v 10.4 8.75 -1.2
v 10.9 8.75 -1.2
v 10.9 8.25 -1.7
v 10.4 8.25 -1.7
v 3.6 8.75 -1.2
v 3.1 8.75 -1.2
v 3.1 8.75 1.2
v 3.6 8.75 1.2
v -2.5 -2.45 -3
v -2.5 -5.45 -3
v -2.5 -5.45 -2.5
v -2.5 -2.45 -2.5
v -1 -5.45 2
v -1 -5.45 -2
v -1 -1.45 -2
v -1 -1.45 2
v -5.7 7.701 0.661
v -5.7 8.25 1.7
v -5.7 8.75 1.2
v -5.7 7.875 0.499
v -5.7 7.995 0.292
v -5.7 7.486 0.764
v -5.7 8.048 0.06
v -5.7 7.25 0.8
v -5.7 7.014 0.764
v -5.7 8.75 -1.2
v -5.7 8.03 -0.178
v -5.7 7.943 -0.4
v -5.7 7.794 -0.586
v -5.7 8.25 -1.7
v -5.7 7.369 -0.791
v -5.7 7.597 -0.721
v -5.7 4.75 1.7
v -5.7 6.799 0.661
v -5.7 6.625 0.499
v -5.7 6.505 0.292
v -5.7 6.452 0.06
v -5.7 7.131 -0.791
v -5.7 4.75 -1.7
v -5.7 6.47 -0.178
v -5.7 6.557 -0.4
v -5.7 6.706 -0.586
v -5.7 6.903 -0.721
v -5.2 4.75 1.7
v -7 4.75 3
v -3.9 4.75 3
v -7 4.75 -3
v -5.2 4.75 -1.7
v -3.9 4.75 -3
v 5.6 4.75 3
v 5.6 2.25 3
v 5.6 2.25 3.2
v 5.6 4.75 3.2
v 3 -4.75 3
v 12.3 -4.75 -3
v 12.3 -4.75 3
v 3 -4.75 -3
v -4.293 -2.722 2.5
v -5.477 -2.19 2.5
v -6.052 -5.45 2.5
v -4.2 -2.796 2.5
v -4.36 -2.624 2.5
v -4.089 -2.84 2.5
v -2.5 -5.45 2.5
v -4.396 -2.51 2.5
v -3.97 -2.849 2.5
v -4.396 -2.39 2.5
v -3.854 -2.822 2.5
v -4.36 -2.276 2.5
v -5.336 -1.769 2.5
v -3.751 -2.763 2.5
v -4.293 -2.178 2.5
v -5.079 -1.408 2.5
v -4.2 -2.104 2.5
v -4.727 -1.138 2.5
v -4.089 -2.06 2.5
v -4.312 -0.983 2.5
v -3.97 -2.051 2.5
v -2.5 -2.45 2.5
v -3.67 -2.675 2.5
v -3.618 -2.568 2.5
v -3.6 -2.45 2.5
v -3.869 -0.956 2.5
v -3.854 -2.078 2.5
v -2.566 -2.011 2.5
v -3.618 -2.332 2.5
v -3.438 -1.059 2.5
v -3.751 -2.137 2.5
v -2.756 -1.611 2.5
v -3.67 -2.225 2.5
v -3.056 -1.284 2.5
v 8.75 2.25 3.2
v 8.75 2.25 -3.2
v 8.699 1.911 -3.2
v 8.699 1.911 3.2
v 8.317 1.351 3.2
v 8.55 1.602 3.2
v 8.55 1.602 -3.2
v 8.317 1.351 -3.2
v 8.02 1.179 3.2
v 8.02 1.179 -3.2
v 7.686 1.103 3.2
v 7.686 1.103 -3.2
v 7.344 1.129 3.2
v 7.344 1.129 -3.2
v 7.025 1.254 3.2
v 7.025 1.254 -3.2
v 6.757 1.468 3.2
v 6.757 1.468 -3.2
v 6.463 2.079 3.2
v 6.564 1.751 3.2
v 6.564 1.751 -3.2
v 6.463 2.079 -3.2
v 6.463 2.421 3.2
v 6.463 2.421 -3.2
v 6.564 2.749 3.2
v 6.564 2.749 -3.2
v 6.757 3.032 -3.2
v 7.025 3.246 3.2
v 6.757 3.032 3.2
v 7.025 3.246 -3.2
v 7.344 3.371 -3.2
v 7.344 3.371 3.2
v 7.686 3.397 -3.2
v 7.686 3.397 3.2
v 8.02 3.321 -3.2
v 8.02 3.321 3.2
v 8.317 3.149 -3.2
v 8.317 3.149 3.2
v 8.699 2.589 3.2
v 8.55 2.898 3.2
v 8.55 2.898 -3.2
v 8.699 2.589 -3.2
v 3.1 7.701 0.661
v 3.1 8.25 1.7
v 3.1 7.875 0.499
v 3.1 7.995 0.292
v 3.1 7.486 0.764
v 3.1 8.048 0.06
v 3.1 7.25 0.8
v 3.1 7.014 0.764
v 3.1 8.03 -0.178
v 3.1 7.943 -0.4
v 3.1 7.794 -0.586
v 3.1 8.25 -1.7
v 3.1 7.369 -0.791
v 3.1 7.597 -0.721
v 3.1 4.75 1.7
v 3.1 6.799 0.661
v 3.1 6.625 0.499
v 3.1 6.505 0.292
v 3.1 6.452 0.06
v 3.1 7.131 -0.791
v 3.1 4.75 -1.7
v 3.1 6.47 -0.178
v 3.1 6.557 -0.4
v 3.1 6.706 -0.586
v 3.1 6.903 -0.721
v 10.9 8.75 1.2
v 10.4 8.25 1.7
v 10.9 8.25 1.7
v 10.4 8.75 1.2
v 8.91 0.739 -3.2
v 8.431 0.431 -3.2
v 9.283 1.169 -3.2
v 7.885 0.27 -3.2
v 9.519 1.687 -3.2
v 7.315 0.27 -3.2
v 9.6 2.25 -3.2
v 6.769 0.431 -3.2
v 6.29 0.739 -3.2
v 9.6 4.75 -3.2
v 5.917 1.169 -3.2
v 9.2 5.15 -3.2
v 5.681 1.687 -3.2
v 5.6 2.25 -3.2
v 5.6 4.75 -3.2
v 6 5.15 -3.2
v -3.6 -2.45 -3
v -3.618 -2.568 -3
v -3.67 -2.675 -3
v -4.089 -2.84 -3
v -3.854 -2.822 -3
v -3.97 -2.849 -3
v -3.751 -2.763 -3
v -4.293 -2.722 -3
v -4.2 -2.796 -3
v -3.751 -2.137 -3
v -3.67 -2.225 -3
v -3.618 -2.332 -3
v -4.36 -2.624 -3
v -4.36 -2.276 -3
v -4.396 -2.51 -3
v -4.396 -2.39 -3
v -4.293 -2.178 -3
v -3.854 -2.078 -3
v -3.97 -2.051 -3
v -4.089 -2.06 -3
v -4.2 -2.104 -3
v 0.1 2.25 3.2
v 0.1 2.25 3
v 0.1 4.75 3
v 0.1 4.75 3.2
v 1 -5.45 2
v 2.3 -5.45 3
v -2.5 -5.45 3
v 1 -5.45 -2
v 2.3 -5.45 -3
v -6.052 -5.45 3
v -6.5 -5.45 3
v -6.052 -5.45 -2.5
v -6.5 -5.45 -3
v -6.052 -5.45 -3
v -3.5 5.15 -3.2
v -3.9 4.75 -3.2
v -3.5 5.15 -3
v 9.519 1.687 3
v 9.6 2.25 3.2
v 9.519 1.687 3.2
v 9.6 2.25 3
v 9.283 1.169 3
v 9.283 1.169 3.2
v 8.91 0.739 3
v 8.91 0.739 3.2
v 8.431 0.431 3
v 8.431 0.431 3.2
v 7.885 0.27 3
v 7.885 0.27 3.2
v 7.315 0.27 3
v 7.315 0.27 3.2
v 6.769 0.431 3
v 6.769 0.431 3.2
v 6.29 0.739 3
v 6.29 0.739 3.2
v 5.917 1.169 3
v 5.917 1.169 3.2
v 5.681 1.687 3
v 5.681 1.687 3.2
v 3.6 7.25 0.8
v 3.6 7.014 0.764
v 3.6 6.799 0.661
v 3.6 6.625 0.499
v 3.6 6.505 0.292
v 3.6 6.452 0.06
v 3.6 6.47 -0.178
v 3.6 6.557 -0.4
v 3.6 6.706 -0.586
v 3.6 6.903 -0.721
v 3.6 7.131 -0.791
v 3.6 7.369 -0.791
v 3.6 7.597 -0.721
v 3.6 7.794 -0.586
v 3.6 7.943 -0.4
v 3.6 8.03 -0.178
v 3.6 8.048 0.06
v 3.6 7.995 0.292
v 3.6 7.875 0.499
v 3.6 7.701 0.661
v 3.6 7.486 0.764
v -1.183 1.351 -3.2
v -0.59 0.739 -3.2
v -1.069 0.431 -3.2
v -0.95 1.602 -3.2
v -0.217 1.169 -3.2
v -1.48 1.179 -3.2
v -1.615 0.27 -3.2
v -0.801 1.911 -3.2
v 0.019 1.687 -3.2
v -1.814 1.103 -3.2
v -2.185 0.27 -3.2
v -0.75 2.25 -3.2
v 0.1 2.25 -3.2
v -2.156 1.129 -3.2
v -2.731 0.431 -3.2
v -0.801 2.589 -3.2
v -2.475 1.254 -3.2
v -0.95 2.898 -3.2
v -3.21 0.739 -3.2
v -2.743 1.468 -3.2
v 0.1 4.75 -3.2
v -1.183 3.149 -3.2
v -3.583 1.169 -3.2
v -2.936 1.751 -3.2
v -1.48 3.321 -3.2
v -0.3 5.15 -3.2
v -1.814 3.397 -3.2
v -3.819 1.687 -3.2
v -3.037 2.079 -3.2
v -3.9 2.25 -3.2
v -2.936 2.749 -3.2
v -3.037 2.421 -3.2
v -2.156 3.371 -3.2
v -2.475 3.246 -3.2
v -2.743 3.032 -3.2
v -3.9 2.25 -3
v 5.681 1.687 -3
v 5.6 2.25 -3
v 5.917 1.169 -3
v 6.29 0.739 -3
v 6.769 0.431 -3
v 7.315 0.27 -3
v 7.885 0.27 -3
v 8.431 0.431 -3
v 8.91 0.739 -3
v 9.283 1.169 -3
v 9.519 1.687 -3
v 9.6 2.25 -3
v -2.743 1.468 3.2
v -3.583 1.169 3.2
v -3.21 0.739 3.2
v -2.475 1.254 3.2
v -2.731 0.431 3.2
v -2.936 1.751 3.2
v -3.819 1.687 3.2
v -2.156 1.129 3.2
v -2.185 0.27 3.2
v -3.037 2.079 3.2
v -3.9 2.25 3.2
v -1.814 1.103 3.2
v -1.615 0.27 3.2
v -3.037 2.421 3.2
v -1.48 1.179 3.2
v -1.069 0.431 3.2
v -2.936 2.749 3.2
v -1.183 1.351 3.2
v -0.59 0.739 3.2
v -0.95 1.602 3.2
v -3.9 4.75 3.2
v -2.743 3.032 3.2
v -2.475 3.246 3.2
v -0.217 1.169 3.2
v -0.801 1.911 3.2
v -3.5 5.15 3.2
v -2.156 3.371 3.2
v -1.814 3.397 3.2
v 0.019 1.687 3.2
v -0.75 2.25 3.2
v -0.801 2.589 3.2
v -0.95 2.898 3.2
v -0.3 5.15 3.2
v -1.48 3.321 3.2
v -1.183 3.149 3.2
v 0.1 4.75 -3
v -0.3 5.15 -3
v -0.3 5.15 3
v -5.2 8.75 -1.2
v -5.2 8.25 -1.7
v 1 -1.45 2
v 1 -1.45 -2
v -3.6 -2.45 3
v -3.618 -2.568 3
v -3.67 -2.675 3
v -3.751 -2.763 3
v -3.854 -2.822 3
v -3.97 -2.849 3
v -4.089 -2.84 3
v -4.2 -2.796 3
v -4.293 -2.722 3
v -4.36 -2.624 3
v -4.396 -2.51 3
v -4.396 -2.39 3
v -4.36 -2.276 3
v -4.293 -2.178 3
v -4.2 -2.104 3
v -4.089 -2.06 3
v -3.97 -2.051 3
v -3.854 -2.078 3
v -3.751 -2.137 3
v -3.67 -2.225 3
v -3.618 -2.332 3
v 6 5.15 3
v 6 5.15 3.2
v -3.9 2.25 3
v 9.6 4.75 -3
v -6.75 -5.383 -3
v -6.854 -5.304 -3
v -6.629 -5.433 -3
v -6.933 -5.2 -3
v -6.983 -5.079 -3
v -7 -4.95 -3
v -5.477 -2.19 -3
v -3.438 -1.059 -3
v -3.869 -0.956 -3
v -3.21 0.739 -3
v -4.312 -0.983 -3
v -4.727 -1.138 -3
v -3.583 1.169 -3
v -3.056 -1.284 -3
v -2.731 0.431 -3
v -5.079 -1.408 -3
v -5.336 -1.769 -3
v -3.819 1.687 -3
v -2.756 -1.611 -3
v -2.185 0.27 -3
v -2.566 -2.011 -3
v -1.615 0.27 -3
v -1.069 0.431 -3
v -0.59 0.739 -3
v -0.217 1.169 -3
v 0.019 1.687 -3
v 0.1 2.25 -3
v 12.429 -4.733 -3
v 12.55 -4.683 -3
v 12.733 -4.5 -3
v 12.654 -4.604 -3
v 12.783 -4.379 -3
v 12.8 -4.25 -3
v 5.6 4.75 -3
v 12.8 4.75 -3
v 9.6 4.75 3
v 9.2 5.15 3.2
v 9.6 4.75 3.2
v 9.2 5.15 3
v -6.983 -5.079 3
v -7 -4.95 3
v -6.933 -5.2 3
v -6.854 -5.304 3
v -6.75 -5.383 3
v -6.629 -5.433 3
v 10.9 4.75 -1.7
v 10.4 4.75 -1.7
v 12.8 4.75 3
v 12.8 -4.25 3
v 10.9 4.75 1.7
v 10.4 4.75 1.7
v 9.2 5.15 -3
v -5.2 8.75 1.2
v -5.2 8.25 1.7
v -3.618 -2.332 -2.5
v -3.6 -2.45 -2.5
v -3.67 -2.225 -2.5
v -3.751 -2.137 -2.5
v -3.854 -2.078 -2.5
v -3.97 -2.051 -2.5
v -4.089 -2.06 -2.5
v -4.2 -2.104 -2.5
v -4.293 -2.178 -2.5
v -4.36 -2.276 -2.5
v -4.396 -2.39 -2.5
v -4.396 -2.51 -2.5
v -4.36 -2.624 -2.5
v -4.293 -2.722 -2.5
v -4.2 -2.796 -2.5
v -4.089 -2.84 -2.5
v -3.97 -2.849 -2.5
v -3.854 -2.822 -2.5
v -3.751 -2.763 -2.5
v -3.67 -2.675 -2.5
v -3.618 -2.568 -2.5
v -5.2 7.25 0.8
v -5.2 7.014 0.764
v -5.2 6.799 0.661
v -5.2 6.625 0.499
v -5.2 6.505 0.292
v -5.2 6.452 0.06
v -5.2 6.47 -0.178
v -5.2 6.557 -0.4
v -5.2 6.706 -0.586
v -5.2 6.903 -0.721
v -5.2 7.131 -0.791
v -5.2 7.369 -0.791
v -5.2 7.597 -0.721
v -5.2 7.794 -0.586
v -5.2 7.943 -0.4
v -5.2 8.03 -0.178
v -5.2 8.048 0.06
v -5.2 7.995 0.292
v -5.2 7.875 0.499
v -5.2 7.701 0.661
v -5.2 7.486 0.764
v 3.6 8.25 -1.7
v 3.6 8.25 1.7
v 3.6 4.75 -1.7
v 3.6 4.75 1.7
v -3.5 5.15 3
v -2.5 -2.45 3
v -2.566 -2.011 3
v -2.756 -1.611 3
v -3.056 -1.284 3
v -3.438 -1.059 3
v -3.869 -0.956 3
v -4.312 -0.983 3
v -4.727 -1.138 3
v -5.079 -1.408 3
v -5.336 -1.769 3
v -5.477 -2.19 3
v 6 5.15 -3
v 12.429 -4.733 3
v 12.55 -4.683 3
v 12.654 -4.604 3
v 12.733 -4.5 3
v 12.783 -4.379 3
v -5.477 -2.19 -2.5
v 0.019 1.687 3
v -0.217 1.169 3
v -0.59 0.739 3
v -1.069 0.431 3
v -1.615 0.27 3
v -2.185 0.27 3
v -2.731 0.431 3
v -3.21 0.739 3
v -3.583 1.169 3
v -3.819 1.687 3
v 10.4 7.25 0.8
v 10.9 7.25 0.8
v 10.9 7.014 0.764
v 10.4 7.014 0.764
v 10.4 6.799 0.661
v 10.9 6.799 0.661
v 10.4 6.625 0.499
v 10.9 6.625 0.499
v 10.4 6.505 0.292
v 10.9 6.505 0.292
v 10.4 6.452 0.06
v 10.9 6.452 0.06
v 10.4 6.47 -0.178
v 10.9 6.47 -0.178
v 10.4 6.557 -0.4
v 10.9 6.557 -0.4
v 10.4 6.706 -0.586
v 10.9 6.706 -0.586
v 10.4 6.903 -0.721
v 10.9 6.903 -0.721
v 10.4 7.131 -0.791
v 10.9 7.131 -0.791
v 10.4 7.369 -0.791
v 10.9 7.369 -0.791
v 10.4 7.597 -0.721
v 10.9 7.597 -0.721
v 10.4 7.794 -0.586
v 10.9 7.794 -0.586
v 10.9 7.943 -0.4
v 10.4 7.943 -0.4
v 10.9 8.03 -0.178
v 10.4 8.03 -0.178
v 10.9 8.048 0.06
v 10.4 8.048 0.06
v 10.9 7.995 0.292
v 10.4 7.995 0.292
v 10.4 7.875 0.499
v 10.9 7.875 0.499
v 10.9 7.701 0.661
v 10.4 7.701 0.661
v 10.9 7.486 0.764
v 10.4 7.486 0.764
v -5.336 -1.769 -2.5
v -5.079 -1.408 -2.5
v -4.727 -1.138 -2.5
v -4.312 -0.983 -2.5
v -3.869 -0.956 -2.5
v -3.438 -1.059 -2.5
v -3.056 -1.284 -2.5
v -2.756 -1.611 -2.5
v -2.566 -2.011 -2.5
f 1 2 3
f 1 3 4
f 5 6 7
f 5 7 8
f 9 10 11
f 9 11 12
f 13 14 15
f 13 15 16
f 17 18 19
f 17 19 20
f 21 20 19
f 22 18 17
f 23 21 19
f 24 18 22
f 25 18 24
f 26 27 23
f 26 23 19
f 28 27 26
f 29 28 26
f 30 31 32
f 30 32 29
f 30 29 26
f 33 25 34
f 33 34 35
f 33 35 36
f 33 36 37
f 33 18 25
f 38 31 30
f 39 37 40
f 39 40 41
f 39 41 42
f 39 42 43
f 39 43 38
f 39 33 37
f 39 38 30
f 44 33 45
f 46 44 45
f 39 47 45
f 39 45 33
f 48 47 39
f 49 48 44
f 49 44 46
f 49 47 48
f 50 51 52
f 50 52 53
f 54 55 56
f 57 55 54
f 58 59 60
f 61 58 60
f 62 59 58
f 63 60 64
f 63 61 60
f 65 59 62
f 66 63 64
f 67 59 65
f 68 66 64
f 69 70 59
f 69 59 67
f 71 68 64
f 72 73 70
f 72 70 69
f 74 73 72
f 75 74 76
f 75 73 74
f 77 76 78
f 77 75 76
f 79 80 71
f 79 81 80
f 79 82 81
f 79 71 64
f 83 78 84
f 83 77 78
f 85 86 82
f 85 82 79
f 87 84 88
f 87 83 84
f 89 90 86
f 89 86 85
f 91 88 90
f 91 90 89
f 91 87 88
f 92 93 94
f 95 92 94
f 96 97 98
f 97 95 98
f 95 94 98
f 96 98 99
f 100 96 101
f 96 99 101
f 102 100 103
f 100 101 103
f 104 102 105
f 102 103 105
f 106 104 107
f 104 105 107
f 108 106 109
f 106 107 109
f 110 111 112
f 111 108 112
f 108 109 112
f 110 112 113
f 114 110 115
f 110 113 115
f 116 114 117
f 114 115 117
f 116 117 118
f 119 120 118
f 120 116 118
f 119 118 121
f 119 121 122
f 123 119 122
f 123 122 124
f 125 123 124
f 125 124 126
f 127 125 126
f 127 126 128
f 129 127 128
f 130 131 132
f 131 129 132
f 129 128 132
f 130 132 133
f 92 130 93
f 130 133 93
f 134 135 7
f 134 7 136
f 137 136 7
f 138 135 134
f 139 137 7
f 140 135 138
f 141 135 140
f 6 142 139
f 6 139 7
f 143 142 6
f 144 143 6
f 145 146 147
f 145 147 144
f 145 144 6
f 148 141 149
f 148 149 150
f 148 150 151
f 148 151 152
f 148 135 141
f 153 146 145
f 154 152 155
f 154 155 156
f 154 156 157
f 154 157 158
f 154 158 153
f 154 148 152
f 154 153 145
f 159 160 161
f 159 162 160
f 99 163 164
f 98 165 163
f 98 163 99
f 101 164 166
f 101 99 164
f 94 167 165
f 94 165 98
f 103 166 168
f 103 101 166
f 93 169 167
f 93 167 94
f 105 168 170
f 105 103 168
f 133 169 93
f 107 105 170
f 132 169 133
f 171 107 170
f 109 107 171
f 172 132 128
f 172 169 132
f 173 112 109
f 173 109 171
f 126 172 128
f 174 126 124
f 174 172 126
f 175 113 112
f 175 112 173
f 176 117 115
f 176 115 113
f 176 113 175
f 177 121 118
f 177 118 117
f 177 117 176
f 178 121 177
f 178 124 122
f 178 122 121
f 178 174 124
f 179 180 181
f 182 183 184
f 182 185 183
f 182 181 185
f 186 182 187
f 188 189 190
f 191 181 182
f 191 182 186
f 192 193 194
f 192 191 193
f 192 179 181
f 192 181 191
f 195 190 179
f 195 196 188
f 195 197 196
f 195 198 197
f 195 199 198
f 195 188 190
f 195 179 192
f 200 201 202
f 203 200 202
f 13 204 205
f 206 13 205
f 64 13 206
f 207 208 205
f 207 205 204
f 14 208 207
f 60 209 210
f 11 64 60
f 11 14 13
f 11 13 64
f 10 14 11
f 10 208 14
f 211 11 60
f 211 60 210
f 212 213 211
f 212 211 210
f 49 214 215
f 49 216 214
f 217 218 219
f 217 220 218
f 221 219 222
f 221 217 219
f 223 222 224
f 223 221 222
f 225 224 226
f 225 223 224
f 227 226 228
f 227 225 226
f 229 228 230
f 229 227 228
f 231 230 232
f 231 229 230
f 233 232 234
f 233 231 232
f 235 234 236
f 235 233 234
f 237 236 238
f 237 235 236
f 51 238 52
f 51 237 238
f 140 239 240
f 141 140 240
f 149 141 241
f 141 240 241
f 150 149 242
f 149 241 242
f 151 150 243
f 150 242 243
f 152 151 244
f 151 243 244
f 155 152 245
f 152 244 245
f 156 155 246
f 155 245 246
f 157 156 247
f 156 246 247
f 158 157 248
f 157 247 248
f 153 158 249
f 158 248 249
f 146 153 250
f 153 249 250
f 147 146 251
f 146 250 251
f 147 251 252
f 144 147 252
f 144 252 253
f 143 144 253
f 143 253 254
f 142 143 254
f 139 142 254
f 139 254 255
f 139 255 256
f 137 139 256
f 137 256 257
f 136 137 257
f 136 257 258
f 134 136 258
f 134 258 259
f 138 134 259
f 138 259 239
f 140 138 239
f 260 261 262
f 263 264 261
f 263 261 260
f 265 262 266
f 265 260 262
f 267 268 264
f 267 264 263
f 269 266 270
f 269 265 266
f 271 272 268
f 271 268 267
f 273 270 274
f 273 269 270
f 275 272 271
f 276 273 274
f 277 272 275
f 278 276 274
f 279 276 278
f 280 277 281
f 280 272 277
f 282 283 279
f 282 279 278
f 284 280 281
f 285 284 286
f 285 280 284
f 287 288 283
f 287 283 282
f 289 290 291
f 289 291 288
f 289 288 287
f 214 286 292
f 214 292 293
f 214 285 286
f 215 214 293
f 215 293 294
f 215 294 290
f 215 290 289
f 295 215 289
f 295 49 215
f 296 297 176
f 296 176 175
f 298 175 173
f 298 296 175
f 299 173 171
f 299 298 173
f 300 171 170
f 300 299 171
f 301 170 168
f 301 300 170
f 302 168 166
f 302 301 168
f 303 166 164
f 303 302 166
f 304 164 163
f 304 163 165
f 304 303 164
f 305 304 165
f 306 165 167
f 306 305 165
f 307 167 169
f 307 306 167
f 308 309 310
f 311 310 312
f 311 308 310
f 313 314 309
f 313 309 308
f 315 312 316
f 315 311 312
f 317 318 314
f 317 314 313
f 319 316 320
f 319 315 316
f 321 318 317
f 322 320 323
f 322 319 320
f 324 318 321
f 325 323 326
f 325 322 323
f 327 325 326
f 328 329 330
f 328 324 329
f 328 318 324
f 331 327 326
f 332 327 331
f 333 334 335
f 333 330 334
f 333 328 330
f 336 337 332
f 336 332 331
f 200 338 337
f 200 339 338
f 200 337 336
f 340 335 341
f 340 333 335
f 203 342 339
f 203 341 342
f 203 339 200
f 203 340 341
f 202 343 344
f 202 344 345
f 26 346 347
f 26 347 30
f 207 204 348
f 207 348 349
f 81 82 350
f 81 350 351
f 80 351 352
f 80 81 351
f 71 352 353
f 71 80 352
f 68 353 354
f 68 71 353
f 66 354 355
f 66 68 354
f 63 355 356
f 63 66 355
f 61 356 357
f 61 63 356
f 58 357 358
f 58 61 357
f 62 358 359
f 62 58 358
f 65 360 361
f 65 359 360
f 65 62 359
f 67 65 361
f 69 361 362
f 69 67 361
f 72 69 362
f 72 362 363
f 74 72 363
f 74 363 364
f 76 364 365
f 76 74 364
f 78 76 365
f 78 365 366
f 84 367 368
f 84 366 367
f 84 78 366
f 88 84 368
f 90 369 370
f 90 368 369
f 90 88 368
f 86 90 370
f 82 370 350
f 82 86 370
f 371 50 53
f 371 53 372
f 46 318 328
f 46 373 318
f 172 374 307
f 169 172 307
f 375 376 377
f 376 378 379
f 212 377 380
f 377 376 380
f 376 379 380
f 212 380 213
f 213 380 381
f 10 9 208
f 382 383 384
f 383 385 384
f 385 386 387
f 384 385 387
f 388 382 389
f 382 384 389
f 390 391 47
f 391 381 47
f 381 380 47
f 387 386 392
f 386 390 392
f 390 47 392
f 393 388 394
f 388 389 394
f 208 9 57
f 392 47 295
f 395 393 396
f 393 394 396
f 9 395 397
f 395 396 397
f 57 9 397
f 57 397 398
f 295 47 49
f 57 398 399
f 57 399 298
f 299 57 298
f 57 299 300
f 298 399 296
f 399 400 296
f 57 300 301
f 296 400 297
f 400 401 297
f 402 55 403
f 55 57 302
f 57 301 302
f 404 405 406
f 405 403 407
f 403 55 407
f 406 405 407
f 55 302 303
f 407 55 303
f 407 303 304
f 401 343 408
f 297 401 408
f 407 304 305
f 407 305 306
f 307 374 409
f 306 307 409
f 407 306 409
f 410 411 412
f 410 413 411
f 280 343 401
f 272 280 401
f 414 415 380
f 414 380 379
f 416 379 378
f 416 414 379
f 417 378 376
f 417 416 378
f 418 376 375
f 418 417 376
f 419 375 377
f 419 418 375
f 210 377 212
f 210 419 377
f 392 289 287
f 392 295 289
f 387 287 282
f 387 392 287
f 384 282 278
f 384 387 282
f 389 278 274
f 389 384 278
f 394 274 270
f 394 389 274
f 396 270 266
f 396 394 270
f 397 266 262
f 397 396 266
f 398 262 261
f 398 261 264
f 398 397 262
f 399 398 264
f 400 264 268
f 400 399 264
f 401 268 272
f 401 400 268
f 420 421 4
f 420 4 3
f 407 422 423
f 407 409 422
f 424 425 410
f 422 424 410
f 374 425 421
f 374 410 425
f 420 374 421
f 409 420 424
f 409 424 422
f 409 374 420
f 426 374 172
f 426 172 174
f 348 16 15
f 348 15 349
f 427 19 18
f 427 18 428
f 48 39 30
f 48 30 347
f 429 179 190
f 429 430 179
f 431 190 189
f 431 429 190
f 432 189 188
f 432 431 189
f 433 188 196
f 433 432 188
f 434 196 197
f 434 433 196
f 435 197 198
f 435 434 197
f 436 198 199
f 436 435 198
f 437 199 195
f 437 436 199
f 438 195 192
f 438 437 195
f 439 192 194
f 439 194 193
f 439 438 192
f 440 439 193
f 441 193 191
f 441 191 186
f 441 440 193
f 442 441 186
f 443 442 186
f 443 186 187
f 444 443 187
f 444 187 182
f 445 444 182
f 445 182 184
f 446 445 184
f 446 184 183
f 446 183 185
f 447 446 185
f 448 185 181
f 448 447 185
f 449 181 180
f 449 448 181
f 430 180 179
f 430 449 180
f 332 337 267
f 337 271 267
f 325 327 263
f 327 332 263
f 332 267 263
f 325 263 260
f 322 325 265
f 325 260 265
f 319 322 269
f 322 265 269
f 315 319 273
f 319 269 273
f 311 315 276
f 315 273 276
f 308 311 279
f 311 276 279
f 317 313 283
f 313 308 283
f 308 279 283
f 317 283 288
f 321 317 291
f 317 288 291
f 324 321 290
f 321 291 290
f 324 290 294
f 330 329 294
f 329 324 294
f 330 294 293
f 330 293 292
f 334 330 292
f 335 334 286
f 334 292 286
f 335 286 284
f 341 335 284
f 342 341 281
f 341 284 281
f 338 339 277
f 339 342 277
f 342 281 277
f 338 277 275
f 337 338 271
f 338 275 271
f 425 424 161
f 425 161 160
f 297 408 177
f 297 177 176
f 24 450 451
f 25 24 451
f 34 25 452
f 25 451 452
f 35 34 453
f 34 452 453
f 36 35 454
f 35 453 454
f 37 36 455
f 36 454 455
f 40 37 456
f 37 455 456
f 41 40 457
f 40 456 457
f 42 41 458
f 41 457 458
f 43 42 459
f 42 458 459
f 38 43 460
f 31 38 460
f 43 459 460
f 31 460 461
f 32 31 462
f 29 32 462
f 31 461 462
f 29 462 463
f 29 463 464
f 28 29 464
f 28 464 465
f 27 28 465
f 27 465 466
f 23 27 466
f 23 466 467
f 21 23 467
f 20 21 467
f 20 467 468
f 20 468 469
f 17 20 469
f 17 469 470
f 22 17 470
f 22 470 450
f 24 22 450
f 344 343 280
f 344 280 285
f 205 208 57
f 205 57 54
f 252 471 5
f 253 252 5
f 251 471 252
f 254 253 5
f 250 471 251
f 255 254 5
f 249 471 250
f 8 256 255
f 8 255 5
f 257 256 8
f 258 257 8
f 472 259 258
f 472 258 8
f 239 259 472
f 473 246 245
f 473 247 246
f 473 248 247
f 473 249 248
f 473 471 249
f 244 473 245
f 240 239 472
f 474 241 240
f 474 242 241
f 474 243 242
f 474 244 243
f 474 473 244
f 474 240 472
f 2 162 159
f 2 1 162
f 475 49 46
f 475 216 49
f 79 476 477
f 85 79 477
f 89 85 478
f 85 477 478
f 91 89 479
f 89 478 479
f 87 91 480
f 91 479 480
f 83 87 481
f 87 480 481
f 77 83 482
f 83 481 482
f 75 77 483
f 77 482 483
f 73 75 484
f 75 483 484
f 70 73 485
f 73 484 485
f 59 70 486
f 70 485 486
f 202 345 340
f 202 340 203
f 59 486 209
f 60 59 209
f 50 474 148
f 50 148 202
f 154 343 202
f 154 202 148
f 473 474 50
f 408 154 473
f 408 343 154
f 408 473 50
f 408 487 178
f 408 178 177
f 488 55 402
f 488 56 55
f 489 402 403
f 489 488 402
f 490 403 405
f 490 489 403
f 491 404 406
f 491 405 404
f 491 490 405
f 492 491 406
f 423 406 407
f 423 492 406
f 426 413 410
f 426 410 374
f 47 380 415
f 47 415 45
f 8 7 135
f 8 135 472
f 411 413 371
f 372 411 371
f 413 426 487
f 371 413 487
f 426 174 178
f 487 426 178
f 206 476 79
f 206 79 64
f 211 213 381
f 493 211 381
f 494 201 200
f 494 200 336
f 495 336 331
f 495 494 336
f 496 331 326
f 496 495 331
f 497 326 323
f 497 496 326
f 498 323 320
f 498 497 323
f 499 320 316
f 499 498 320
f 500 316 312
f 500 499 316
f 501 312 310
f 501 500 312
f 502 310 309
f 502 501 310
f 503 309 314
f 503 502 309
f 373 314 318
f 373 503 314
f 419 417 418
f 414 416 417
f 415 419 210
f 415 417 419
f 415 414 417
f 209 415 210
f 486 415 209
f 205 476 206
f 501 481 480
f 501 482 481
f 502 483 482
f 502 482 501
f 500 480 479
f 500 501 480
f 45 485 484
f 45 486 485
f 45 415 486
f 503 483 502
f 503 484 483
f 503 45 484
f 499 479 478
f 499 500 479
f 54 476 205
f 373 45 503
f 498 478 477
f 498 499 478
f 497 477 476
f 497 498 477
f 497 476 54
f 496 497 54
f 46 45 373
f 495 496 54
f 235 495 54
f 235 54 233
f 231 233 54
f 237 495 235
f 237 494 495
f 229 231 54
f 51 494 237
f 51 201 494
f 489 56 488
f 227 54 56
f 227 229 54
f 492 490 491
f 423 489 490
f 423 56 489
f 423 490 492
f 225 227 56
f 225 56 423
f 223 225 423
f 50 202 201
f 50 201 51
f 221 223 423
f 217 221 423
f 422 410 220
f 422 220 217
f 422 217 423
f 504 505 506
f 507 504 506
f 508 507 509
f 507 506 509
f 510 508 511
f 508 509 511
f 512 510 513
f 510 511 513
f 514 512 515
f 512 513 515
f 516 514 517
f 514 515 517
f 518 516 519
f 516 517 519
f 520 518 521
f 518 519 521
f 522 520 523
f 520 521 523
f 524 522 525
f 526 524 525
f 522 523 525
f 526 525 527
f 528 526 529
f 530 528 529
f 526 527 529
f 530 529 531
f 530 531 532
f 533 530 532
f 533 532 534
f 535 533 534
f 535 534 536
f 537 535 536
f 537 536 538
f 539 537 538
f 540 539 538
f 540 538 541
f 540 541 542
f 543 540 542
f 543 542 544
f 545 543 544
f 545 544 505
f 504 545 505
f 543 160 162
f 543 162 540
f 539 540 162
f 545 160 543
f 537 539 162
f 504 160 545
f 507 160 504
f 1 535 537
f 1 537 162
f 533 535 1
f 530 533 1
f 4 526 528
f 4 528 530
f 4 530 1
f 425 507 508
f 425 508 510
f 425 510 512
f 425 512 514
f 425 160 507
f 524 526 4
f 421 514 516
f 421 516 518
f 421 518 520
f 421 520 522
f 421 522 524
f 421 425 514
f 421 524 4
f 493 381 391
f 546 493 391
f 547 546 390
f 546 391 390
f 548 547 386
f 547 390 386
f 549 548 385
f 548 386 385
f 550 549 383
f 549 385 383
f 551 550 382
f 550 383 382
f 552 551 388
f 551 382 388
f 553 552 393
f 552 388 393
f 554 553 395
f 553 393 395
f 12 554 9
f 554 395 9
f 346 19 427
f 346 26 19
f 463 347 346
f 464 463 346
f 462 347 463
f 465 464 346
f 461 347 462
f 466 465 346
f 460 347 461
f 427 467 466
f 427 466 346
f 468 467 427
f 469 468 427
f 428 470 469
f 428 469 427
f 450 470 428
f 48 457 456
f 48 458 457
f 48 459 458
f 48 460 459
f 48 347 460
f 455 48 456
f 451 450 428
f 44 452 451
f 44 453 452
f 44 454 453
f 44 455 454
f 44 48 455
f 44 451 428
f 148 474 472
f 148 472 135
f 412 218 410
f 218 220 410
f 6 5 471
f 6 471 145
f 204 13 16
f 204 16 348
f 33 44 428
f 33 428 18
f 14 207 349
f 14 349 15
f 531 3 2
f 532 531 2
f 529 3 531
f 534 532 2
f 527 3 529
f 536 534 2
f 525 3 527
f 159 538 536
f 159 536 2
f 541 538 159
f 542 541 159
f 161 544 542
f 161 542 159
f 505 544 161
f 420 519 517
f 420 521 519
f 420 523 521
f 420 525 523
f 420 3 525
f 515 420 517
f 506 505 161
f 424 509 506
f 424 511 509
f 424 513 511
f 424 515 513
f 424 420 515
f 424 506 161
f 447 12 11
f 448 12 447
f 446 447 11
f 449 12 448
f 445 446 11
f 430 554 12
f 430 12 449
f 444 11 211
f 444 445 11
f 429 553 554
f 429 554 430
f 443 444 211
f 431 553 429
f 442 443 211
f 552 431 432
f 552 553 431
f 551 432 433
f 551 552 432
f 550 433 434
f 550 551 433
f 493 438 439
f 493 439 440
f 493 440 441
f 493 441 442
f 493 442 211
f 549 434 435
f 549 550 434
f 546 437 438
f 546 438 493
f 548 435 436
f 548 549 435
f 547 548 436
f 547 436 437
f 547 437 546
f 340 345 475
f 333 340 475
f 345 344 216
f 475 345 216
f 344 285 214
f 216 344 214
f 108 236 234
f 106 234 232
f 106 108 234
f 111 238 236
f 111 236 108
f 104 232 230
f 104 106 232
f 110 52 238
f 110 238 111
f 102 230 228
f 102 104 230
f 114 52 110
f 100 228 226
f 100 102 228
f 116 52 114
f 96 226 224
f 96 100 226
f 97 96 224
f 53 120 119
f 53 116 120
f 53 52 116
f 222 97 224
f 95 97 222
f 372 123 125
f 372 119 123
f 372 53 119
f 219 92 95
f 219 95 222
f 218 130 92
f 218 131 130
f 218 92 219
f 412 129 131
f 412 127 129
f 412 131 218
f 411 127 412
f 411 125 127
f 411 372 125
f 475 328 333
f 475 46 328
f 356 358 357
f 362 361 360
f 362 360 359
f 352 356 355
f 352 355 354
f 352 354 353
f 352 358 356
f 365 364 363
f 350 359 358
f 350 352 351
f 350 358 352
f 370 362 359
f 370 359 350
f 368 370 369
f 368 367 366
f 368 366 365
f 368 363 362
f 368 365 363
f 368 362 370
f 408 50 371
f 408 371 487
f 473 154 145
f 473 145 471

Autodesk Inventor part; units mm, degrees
ref_plane "YZ Plane" through (0, 0, 0) normal (1, 0, 0) x (0, 1, 0)
ref_plane "XZ Plane" through (0, 0, 0) normal (0, 1, 0) x (-1, 0, 0)
ref_plane "XY Plane" through (0, 0, 0) normal (0, 0, 1) x (1, 0, 0)
sketch "Sketch2" plane through (0, 0, 0) normal (0, 0, 1) x (1, 0, 0)
  line L0 (-7, 4.75) -> (12.8, 4.75)
  line L1 (12.8, 4.75) -> (12.8, -4.75)
  line L2 (12.8, -4.75) -> (-7, -4.75)
  line L3 (-7, -4.75) -> (-7, 4.75)
  line L4 (-3.9, 4.75) -> (0.1, 4.75)
  line L5 (0.1, 4.75) -> (0.1, 5.15)
  line L6 (0.1, 5.15) -> (-3.9, 5.15)
  line L7 (-3.9, 5.15) -> (-3.9, 4.75)
  line L8 (5.6, 4.75) -> (9.6, 4.75)
  line L9 (9.6, 4.75) -> (9.6, 5.15)
  line L10 (9.6, 5.15) -> (5.6, 5.15)
  line L11 (5.6, 5.15) -> (5.6, 4.75)
  line L12 (-7, -4.75) -> (3, -4.75)
  line L13 (3, -4.75) -> (3, -5.45)
  line L14 (3, -5.45) -> (-7, -5.45)
  line L15 (-7, -5.45) -> (-7, -4.75)
  circle A0 centre (-1.9, 2.25) radius 1.15
  circle A1 centre (7.6, 2.25) radius 1.15
  point P0 (0, 0)
  dimension "d2" = 19.8
  dimension "d3" = 9.5
  dimension "d4" = 7
  dimension "d5" = 4.75
  dimension "d6" = 0.4
  dimension "d8" = 0.4
  dimension "d10" = 4
  dimension "d11" = 4
  dimension "d13" = 10
  dimension "d14" = 5.1
  dimension "d15" = 9.5
  dimension "d16" = 2
  dimension "d17" = 2
  dimension "d18" = 3.2
  dimension "d21" = 2.3
  dimension "d22" = 2.3
  dimension "d80" = 7.2
  dimension "d81" = 2.5
  dimension "d82" = 2.5
  dimension "d83" = 10.2
extrude "Extrusion1" add sketch "Sketch2" along normal mid plane 6
chamfer "Chamfer1" distance 0.4 angle 45 4 edges at (-3.9, 5.15, 0) (0.1, 5.15, 0) (5.6, 5.15, 0) (9.6, 5.15, 0)
chamfer "Chamfer3" distance 0.7 angle 45 1 edges at (3, -5.45, 0)
sketch "Sketch3" plane through (0, 0, 3) normal (0, 0, 1) x (1, 0, 0)
  line L0 (9.2, 5.15) -> (9.6, 4.75) projected
  line L1 (9.6, 5.15) -> (5.6, 5.15) projected
  line L2 (5.6, 4.75) -> (6, 5.15) projected
  line L3 (-0.3, 5.15) -> (0.1, 4.75) projected
  line L4 (0.1, 5.15) -> (-3.9, 5.15) projected
  line L5 (-3.9, 4.75) -> (-3.5, 5.15) projected
  circle A0 centre (7.6, 2.25) radius 1.15 projected
  circle A1 centre (-1.9, 2.25) radius 1.15 projected
  circle A2 centre (-1.9, 2.25) radius 2
  circle A3 centre (7.6, 2.25) radius 2
  line L6 (-3.9, 2.25) -> (-3.9, 4.75)
  line L7 (0.1, 2.25) -> (0.1, 4.75)
  line L8 (5.6, 2.25) -> (5.6, 4.75)
  line L9 (9.6, 2.25) -> (9.6, 4.75)
  point P0 (0, 0)
  dimension "d28" = 4
  dimension "d29" = 4
  dimension "d30" = 4
extrude "Extrusion2" add sketch "Sketch3" along normal blind 0.2
mirror "Mirror1" about plane through (0, 0, 0) normal (0, 0, 1) of "Extrusion2"
sketch "Sketch4" plane through (-7, -5.45, -3) normal (0, -1, 0) x (1, 0, 0)
  line L0 (6, 5) -> (8, 5)
  line L1 (8, 5) -> (8, 1)
  line L2 (8, 1) -> (6, 1)
  line L3 (6, 1) -> (6, 5)
  point P0 (7, 3)
  dimension "d33" = 2
  dimension "d34" = 4
  dimension "d35" = 1
  dimension "d36" = 2
extrude "Extrusion3" cut sketch "Sketch4" against normal blind 4
sketch "Sketch5" plane through (-7, 4.75, 3) normal (0, 1, 0) x (1, 0, 0)
  line L0 (7.1, 6) -> (12.6, 6)
  line L1 (12.6, 0) -> (7.1, 0)
  line L2 (19.6, 0) -> (16.4, 0)
  line L3 (16.4, 6) -> (19.6, 6)
  line L4 (1.3, 4.7) -> (1.8, 4.7)
  line L5 (1.8, 4.7) -> (1.8, 1.3)
  line L6 (1.8, 1.3) -> (1.3, 1.3)
  line L7 (1.3, 1.3) -> (1.3, 4.7)
  line L8 (10.1, 4.7) -> (10.6, 4.7)
  line L9 (10.6, 4.7) -> (10.6, 1.3)
  line L10 (10.6, 1.3) -> (10.1, 1.3)
  line L11 (10.1, 1.3) -> (10.1, 4.7)
  line L12 (-0.2, 3) -> (19.6, 3) construction
  line L13 (17.4, 4.7) -> (17.9, 4.7)
  line L14 (17.9, 4.7) -> (17.9, 1.3)
  line L15 (17.9, 1.3) -> (17.4, 1.3)
  line L16 (17.4, 1.3) -> (17.4, 4.7)
  line L17 (0, 0) -> (0, 6)
  line L18 (0, 6) -> (3.1, 6)
  line L19 (0, 0) -> (0, 6)
  line L20 (19.8, 0) -> (16.6, 0)
  line L21 (19.8, 6) -> (19.8, 0)
  line L22 (0, 6) -> (3.1, 6)
  line L23 (3.1, 0) -> (3.1, 6)
  line L24 (3.1, 0) -> (0, 0)
  line L25 (12.6, 0) -> (12.6, 6)
  line L26 (7.1, 6) -> (12.6, 6)
  line L27 (7.1, 6) -> (7.1, 0)
  line L28 (12.6, 0) -> (7.1, 0)
  line L29 (16.4, 6) -> (16.4, 0)
  line L30 (3.1, 0) -> (3.1, 6)
  line L31 (3.1, 0) -> (0, 0)
  line L32 (12.6, 0) -> (12.6, 6)
  line L33 (7.1, 6) -> (7.1, 0)
  line L34 (16.6, 6) -> (16.6, 0)
  line L35 (16.6, 6) -> (19.8, 6)
  line L36 (3.1, 0) -> (0.4, 0) projected
  line L37 (1.55, 4.7) -> (1.55, 1.3) construction
  line L38 (10.35, 4.7) -> (10.35, 1.3) construction
  line L39 (17.65, 4.7) -> (17.65, 1.3) construction
  point P0 (7, 3)
  dimension "d39" = 3.4
  dimension "d40" = 3.4
  dimension "d41" = 0.5
  dimension "d42" = 0.5
  dimension "d43" = 1.7
  dimension "d44" = 1.7
  dimension "d46" = 9.3
  dimension "d47" = 3.4
  dimension "d48" = 0.5
  dimension "d49" = 1.7
  dimension "d50" = 16.6
  dimension "d87" = 8.8
  dimension "d88" = 7.3
  dimension "d89" = 3.1
  dimension "d90" = 1.55
  dimension "d91" = 6
  dimension "d92" = 3
extrude "Extrusion4" add sketch "Sketch5" along normal blind 4 contours L4 L5 L6 L7 | L8 L9 L10 L11 | L13 L14 L15 L16
chamfer "Chamfer2" distance 0.5 angle 45 6 edges at (-5.45, 8.75, 1.7) (-5.45, 8.75, -1.7) (3.35, 8.75, -1.7) (3.35, 8.75, 1.7) (10.65, 8.75, -1.7) (10.65, 8.75, 1.7)
sketch "Sketch6" plane through (-5.7, 4.75, -1.7) normal (-1, 0, 0) x (0, 0, 1)
  line L0 (0, 0) -> (0, 3.5) projected
  line L1 (3.4, 0) -> (3.4, 3.5) projected
  line L2 (0.5, 4) -> (2.9, 4) projected
  point P0 (1.7, -4.75)
  point P1 (1.7, 2.5)
  dimension "d56" = 3.4
  dimension "d57" = 1.7
  dimension "d58" = 1.5
hole "Hole1" at (-5.7, 7.25, 0) direction (1, 0, 0) diameter 1.6 end through all
sketch "Sketch7" plane through (0, 0, 3) normal (0, 0, 1) x (1, 0, 0)
  line L0 (-7, 4.75) -> (-7, -5.45) projected
  line L1 (-7, -5.45) -> (3, -5.45) projected
  line L2 (-4, -5.45) -> (-4, -2.45) construction
  line L3 (-5.5, -5.45) -> (-5.5, -2.45)
  line L4 (-2.5, -2.45) -> (-2.5, -5.45)
  arc A0 (-5.5, -5.45) -> (-2.5, -5.45) centre (-4, -5.45) ccw
  arc A1 (-2.5, -2.45) -> (-5.5, -2.45) centre (-4, -2.45) ccw
  point P0 (2.6, -5.45)
  point P1 (0, 0)
  point P2 (-4, -3.95)
  dimension "d66" = 3
  dimension "d68" = 3
  dimension "d69" = 3
extrude "Extrusion5" cut sketch "Sketch7" against normal blind 0.5
sketch "Sketch8" plane through (0, 0, 2.5) normal (0, 0, 1) x (1, 0, 0)
  arc A0 (-2.5, -2.45) -> (-5.5, -2.45) centre (-4, -2.45) ccw projected
  circle A1 centre (-4, -2.45) radius 0.4
  point P0 (0, 0)
  dimension "d72" = 0.8
extrude "Extrusion6" add sketch "Sketch8" along normal up to surface (0.5 mm away)
mirror "Mirror2" about plane through (0, 0, 0) normal (0, 0, 1) of "Extrusion5", "Extrusion6"
sketch "Sketch9" plane through (0, 0, -3) normal (0, 0, -1) x (-1, 0, 0)
  arc A0 (5.5, -2.45) -> (2.5, -2.45) centre (4, -2.45) ccw projected
  line L0 (5.5, -2.45) -> (5.5, -5.45) projected
  line L1 (5.5, -5.45) -> (7, -5.45) projected
  line L2 (6.0521, -5.45) -> (5.4772, -2.1895)
  line L3 (6.0521, -5.45) -> (5.5, -5.45)
  point P0 (0, 0)
  dimension "d75" = 10
extrude "Extrusion7" cut sketch "Sketch9" against normal up to surface (0.5 mm away)
mirror "Mirror3" about plane through (0, 0, 0) normal (0, 0, 1) of "Extrusion7"
fillet "Fillet1" radius 0.5 2 edges at (12.8, -4.75, 0) (-7, -5.45, 0)
equation "\"d5\" = 0.5 * d3"
equation "\"d8\" = d6"
equation "\"d11\" = d10"
equation "\"d16\" = 0.5 * d10"
equation "\"d17\" = 0.5 * d11"
equation "\"d22\" = d21"
equation "\"d82\" = d81"
equation "\"d29\" = d28"
equation "\"d30\" = d29"
equation "\"d35\" = 0.5 * d33"
equation "\"d36\" = 0.5 * d34"
equation "\"d40\" = d39"
equation "\"d42\" = d41"
equation "\"d43\" = 0.5 * d39"
equation "\"d44\" = 0.5 * d40"
equation "\"d47\" = d39"
equation "\"d48\" = d41"
equation "\"d49\" = 0.5 * d47"
equation "\"d90\" = 0.5 * d89"
equation "\"d92\" = 0.5 * d91"
equation "\"d57\" = 0.5 * d56"
properties part number "KW-5A-125250V_body#" material "PC_ABS Plastic"
